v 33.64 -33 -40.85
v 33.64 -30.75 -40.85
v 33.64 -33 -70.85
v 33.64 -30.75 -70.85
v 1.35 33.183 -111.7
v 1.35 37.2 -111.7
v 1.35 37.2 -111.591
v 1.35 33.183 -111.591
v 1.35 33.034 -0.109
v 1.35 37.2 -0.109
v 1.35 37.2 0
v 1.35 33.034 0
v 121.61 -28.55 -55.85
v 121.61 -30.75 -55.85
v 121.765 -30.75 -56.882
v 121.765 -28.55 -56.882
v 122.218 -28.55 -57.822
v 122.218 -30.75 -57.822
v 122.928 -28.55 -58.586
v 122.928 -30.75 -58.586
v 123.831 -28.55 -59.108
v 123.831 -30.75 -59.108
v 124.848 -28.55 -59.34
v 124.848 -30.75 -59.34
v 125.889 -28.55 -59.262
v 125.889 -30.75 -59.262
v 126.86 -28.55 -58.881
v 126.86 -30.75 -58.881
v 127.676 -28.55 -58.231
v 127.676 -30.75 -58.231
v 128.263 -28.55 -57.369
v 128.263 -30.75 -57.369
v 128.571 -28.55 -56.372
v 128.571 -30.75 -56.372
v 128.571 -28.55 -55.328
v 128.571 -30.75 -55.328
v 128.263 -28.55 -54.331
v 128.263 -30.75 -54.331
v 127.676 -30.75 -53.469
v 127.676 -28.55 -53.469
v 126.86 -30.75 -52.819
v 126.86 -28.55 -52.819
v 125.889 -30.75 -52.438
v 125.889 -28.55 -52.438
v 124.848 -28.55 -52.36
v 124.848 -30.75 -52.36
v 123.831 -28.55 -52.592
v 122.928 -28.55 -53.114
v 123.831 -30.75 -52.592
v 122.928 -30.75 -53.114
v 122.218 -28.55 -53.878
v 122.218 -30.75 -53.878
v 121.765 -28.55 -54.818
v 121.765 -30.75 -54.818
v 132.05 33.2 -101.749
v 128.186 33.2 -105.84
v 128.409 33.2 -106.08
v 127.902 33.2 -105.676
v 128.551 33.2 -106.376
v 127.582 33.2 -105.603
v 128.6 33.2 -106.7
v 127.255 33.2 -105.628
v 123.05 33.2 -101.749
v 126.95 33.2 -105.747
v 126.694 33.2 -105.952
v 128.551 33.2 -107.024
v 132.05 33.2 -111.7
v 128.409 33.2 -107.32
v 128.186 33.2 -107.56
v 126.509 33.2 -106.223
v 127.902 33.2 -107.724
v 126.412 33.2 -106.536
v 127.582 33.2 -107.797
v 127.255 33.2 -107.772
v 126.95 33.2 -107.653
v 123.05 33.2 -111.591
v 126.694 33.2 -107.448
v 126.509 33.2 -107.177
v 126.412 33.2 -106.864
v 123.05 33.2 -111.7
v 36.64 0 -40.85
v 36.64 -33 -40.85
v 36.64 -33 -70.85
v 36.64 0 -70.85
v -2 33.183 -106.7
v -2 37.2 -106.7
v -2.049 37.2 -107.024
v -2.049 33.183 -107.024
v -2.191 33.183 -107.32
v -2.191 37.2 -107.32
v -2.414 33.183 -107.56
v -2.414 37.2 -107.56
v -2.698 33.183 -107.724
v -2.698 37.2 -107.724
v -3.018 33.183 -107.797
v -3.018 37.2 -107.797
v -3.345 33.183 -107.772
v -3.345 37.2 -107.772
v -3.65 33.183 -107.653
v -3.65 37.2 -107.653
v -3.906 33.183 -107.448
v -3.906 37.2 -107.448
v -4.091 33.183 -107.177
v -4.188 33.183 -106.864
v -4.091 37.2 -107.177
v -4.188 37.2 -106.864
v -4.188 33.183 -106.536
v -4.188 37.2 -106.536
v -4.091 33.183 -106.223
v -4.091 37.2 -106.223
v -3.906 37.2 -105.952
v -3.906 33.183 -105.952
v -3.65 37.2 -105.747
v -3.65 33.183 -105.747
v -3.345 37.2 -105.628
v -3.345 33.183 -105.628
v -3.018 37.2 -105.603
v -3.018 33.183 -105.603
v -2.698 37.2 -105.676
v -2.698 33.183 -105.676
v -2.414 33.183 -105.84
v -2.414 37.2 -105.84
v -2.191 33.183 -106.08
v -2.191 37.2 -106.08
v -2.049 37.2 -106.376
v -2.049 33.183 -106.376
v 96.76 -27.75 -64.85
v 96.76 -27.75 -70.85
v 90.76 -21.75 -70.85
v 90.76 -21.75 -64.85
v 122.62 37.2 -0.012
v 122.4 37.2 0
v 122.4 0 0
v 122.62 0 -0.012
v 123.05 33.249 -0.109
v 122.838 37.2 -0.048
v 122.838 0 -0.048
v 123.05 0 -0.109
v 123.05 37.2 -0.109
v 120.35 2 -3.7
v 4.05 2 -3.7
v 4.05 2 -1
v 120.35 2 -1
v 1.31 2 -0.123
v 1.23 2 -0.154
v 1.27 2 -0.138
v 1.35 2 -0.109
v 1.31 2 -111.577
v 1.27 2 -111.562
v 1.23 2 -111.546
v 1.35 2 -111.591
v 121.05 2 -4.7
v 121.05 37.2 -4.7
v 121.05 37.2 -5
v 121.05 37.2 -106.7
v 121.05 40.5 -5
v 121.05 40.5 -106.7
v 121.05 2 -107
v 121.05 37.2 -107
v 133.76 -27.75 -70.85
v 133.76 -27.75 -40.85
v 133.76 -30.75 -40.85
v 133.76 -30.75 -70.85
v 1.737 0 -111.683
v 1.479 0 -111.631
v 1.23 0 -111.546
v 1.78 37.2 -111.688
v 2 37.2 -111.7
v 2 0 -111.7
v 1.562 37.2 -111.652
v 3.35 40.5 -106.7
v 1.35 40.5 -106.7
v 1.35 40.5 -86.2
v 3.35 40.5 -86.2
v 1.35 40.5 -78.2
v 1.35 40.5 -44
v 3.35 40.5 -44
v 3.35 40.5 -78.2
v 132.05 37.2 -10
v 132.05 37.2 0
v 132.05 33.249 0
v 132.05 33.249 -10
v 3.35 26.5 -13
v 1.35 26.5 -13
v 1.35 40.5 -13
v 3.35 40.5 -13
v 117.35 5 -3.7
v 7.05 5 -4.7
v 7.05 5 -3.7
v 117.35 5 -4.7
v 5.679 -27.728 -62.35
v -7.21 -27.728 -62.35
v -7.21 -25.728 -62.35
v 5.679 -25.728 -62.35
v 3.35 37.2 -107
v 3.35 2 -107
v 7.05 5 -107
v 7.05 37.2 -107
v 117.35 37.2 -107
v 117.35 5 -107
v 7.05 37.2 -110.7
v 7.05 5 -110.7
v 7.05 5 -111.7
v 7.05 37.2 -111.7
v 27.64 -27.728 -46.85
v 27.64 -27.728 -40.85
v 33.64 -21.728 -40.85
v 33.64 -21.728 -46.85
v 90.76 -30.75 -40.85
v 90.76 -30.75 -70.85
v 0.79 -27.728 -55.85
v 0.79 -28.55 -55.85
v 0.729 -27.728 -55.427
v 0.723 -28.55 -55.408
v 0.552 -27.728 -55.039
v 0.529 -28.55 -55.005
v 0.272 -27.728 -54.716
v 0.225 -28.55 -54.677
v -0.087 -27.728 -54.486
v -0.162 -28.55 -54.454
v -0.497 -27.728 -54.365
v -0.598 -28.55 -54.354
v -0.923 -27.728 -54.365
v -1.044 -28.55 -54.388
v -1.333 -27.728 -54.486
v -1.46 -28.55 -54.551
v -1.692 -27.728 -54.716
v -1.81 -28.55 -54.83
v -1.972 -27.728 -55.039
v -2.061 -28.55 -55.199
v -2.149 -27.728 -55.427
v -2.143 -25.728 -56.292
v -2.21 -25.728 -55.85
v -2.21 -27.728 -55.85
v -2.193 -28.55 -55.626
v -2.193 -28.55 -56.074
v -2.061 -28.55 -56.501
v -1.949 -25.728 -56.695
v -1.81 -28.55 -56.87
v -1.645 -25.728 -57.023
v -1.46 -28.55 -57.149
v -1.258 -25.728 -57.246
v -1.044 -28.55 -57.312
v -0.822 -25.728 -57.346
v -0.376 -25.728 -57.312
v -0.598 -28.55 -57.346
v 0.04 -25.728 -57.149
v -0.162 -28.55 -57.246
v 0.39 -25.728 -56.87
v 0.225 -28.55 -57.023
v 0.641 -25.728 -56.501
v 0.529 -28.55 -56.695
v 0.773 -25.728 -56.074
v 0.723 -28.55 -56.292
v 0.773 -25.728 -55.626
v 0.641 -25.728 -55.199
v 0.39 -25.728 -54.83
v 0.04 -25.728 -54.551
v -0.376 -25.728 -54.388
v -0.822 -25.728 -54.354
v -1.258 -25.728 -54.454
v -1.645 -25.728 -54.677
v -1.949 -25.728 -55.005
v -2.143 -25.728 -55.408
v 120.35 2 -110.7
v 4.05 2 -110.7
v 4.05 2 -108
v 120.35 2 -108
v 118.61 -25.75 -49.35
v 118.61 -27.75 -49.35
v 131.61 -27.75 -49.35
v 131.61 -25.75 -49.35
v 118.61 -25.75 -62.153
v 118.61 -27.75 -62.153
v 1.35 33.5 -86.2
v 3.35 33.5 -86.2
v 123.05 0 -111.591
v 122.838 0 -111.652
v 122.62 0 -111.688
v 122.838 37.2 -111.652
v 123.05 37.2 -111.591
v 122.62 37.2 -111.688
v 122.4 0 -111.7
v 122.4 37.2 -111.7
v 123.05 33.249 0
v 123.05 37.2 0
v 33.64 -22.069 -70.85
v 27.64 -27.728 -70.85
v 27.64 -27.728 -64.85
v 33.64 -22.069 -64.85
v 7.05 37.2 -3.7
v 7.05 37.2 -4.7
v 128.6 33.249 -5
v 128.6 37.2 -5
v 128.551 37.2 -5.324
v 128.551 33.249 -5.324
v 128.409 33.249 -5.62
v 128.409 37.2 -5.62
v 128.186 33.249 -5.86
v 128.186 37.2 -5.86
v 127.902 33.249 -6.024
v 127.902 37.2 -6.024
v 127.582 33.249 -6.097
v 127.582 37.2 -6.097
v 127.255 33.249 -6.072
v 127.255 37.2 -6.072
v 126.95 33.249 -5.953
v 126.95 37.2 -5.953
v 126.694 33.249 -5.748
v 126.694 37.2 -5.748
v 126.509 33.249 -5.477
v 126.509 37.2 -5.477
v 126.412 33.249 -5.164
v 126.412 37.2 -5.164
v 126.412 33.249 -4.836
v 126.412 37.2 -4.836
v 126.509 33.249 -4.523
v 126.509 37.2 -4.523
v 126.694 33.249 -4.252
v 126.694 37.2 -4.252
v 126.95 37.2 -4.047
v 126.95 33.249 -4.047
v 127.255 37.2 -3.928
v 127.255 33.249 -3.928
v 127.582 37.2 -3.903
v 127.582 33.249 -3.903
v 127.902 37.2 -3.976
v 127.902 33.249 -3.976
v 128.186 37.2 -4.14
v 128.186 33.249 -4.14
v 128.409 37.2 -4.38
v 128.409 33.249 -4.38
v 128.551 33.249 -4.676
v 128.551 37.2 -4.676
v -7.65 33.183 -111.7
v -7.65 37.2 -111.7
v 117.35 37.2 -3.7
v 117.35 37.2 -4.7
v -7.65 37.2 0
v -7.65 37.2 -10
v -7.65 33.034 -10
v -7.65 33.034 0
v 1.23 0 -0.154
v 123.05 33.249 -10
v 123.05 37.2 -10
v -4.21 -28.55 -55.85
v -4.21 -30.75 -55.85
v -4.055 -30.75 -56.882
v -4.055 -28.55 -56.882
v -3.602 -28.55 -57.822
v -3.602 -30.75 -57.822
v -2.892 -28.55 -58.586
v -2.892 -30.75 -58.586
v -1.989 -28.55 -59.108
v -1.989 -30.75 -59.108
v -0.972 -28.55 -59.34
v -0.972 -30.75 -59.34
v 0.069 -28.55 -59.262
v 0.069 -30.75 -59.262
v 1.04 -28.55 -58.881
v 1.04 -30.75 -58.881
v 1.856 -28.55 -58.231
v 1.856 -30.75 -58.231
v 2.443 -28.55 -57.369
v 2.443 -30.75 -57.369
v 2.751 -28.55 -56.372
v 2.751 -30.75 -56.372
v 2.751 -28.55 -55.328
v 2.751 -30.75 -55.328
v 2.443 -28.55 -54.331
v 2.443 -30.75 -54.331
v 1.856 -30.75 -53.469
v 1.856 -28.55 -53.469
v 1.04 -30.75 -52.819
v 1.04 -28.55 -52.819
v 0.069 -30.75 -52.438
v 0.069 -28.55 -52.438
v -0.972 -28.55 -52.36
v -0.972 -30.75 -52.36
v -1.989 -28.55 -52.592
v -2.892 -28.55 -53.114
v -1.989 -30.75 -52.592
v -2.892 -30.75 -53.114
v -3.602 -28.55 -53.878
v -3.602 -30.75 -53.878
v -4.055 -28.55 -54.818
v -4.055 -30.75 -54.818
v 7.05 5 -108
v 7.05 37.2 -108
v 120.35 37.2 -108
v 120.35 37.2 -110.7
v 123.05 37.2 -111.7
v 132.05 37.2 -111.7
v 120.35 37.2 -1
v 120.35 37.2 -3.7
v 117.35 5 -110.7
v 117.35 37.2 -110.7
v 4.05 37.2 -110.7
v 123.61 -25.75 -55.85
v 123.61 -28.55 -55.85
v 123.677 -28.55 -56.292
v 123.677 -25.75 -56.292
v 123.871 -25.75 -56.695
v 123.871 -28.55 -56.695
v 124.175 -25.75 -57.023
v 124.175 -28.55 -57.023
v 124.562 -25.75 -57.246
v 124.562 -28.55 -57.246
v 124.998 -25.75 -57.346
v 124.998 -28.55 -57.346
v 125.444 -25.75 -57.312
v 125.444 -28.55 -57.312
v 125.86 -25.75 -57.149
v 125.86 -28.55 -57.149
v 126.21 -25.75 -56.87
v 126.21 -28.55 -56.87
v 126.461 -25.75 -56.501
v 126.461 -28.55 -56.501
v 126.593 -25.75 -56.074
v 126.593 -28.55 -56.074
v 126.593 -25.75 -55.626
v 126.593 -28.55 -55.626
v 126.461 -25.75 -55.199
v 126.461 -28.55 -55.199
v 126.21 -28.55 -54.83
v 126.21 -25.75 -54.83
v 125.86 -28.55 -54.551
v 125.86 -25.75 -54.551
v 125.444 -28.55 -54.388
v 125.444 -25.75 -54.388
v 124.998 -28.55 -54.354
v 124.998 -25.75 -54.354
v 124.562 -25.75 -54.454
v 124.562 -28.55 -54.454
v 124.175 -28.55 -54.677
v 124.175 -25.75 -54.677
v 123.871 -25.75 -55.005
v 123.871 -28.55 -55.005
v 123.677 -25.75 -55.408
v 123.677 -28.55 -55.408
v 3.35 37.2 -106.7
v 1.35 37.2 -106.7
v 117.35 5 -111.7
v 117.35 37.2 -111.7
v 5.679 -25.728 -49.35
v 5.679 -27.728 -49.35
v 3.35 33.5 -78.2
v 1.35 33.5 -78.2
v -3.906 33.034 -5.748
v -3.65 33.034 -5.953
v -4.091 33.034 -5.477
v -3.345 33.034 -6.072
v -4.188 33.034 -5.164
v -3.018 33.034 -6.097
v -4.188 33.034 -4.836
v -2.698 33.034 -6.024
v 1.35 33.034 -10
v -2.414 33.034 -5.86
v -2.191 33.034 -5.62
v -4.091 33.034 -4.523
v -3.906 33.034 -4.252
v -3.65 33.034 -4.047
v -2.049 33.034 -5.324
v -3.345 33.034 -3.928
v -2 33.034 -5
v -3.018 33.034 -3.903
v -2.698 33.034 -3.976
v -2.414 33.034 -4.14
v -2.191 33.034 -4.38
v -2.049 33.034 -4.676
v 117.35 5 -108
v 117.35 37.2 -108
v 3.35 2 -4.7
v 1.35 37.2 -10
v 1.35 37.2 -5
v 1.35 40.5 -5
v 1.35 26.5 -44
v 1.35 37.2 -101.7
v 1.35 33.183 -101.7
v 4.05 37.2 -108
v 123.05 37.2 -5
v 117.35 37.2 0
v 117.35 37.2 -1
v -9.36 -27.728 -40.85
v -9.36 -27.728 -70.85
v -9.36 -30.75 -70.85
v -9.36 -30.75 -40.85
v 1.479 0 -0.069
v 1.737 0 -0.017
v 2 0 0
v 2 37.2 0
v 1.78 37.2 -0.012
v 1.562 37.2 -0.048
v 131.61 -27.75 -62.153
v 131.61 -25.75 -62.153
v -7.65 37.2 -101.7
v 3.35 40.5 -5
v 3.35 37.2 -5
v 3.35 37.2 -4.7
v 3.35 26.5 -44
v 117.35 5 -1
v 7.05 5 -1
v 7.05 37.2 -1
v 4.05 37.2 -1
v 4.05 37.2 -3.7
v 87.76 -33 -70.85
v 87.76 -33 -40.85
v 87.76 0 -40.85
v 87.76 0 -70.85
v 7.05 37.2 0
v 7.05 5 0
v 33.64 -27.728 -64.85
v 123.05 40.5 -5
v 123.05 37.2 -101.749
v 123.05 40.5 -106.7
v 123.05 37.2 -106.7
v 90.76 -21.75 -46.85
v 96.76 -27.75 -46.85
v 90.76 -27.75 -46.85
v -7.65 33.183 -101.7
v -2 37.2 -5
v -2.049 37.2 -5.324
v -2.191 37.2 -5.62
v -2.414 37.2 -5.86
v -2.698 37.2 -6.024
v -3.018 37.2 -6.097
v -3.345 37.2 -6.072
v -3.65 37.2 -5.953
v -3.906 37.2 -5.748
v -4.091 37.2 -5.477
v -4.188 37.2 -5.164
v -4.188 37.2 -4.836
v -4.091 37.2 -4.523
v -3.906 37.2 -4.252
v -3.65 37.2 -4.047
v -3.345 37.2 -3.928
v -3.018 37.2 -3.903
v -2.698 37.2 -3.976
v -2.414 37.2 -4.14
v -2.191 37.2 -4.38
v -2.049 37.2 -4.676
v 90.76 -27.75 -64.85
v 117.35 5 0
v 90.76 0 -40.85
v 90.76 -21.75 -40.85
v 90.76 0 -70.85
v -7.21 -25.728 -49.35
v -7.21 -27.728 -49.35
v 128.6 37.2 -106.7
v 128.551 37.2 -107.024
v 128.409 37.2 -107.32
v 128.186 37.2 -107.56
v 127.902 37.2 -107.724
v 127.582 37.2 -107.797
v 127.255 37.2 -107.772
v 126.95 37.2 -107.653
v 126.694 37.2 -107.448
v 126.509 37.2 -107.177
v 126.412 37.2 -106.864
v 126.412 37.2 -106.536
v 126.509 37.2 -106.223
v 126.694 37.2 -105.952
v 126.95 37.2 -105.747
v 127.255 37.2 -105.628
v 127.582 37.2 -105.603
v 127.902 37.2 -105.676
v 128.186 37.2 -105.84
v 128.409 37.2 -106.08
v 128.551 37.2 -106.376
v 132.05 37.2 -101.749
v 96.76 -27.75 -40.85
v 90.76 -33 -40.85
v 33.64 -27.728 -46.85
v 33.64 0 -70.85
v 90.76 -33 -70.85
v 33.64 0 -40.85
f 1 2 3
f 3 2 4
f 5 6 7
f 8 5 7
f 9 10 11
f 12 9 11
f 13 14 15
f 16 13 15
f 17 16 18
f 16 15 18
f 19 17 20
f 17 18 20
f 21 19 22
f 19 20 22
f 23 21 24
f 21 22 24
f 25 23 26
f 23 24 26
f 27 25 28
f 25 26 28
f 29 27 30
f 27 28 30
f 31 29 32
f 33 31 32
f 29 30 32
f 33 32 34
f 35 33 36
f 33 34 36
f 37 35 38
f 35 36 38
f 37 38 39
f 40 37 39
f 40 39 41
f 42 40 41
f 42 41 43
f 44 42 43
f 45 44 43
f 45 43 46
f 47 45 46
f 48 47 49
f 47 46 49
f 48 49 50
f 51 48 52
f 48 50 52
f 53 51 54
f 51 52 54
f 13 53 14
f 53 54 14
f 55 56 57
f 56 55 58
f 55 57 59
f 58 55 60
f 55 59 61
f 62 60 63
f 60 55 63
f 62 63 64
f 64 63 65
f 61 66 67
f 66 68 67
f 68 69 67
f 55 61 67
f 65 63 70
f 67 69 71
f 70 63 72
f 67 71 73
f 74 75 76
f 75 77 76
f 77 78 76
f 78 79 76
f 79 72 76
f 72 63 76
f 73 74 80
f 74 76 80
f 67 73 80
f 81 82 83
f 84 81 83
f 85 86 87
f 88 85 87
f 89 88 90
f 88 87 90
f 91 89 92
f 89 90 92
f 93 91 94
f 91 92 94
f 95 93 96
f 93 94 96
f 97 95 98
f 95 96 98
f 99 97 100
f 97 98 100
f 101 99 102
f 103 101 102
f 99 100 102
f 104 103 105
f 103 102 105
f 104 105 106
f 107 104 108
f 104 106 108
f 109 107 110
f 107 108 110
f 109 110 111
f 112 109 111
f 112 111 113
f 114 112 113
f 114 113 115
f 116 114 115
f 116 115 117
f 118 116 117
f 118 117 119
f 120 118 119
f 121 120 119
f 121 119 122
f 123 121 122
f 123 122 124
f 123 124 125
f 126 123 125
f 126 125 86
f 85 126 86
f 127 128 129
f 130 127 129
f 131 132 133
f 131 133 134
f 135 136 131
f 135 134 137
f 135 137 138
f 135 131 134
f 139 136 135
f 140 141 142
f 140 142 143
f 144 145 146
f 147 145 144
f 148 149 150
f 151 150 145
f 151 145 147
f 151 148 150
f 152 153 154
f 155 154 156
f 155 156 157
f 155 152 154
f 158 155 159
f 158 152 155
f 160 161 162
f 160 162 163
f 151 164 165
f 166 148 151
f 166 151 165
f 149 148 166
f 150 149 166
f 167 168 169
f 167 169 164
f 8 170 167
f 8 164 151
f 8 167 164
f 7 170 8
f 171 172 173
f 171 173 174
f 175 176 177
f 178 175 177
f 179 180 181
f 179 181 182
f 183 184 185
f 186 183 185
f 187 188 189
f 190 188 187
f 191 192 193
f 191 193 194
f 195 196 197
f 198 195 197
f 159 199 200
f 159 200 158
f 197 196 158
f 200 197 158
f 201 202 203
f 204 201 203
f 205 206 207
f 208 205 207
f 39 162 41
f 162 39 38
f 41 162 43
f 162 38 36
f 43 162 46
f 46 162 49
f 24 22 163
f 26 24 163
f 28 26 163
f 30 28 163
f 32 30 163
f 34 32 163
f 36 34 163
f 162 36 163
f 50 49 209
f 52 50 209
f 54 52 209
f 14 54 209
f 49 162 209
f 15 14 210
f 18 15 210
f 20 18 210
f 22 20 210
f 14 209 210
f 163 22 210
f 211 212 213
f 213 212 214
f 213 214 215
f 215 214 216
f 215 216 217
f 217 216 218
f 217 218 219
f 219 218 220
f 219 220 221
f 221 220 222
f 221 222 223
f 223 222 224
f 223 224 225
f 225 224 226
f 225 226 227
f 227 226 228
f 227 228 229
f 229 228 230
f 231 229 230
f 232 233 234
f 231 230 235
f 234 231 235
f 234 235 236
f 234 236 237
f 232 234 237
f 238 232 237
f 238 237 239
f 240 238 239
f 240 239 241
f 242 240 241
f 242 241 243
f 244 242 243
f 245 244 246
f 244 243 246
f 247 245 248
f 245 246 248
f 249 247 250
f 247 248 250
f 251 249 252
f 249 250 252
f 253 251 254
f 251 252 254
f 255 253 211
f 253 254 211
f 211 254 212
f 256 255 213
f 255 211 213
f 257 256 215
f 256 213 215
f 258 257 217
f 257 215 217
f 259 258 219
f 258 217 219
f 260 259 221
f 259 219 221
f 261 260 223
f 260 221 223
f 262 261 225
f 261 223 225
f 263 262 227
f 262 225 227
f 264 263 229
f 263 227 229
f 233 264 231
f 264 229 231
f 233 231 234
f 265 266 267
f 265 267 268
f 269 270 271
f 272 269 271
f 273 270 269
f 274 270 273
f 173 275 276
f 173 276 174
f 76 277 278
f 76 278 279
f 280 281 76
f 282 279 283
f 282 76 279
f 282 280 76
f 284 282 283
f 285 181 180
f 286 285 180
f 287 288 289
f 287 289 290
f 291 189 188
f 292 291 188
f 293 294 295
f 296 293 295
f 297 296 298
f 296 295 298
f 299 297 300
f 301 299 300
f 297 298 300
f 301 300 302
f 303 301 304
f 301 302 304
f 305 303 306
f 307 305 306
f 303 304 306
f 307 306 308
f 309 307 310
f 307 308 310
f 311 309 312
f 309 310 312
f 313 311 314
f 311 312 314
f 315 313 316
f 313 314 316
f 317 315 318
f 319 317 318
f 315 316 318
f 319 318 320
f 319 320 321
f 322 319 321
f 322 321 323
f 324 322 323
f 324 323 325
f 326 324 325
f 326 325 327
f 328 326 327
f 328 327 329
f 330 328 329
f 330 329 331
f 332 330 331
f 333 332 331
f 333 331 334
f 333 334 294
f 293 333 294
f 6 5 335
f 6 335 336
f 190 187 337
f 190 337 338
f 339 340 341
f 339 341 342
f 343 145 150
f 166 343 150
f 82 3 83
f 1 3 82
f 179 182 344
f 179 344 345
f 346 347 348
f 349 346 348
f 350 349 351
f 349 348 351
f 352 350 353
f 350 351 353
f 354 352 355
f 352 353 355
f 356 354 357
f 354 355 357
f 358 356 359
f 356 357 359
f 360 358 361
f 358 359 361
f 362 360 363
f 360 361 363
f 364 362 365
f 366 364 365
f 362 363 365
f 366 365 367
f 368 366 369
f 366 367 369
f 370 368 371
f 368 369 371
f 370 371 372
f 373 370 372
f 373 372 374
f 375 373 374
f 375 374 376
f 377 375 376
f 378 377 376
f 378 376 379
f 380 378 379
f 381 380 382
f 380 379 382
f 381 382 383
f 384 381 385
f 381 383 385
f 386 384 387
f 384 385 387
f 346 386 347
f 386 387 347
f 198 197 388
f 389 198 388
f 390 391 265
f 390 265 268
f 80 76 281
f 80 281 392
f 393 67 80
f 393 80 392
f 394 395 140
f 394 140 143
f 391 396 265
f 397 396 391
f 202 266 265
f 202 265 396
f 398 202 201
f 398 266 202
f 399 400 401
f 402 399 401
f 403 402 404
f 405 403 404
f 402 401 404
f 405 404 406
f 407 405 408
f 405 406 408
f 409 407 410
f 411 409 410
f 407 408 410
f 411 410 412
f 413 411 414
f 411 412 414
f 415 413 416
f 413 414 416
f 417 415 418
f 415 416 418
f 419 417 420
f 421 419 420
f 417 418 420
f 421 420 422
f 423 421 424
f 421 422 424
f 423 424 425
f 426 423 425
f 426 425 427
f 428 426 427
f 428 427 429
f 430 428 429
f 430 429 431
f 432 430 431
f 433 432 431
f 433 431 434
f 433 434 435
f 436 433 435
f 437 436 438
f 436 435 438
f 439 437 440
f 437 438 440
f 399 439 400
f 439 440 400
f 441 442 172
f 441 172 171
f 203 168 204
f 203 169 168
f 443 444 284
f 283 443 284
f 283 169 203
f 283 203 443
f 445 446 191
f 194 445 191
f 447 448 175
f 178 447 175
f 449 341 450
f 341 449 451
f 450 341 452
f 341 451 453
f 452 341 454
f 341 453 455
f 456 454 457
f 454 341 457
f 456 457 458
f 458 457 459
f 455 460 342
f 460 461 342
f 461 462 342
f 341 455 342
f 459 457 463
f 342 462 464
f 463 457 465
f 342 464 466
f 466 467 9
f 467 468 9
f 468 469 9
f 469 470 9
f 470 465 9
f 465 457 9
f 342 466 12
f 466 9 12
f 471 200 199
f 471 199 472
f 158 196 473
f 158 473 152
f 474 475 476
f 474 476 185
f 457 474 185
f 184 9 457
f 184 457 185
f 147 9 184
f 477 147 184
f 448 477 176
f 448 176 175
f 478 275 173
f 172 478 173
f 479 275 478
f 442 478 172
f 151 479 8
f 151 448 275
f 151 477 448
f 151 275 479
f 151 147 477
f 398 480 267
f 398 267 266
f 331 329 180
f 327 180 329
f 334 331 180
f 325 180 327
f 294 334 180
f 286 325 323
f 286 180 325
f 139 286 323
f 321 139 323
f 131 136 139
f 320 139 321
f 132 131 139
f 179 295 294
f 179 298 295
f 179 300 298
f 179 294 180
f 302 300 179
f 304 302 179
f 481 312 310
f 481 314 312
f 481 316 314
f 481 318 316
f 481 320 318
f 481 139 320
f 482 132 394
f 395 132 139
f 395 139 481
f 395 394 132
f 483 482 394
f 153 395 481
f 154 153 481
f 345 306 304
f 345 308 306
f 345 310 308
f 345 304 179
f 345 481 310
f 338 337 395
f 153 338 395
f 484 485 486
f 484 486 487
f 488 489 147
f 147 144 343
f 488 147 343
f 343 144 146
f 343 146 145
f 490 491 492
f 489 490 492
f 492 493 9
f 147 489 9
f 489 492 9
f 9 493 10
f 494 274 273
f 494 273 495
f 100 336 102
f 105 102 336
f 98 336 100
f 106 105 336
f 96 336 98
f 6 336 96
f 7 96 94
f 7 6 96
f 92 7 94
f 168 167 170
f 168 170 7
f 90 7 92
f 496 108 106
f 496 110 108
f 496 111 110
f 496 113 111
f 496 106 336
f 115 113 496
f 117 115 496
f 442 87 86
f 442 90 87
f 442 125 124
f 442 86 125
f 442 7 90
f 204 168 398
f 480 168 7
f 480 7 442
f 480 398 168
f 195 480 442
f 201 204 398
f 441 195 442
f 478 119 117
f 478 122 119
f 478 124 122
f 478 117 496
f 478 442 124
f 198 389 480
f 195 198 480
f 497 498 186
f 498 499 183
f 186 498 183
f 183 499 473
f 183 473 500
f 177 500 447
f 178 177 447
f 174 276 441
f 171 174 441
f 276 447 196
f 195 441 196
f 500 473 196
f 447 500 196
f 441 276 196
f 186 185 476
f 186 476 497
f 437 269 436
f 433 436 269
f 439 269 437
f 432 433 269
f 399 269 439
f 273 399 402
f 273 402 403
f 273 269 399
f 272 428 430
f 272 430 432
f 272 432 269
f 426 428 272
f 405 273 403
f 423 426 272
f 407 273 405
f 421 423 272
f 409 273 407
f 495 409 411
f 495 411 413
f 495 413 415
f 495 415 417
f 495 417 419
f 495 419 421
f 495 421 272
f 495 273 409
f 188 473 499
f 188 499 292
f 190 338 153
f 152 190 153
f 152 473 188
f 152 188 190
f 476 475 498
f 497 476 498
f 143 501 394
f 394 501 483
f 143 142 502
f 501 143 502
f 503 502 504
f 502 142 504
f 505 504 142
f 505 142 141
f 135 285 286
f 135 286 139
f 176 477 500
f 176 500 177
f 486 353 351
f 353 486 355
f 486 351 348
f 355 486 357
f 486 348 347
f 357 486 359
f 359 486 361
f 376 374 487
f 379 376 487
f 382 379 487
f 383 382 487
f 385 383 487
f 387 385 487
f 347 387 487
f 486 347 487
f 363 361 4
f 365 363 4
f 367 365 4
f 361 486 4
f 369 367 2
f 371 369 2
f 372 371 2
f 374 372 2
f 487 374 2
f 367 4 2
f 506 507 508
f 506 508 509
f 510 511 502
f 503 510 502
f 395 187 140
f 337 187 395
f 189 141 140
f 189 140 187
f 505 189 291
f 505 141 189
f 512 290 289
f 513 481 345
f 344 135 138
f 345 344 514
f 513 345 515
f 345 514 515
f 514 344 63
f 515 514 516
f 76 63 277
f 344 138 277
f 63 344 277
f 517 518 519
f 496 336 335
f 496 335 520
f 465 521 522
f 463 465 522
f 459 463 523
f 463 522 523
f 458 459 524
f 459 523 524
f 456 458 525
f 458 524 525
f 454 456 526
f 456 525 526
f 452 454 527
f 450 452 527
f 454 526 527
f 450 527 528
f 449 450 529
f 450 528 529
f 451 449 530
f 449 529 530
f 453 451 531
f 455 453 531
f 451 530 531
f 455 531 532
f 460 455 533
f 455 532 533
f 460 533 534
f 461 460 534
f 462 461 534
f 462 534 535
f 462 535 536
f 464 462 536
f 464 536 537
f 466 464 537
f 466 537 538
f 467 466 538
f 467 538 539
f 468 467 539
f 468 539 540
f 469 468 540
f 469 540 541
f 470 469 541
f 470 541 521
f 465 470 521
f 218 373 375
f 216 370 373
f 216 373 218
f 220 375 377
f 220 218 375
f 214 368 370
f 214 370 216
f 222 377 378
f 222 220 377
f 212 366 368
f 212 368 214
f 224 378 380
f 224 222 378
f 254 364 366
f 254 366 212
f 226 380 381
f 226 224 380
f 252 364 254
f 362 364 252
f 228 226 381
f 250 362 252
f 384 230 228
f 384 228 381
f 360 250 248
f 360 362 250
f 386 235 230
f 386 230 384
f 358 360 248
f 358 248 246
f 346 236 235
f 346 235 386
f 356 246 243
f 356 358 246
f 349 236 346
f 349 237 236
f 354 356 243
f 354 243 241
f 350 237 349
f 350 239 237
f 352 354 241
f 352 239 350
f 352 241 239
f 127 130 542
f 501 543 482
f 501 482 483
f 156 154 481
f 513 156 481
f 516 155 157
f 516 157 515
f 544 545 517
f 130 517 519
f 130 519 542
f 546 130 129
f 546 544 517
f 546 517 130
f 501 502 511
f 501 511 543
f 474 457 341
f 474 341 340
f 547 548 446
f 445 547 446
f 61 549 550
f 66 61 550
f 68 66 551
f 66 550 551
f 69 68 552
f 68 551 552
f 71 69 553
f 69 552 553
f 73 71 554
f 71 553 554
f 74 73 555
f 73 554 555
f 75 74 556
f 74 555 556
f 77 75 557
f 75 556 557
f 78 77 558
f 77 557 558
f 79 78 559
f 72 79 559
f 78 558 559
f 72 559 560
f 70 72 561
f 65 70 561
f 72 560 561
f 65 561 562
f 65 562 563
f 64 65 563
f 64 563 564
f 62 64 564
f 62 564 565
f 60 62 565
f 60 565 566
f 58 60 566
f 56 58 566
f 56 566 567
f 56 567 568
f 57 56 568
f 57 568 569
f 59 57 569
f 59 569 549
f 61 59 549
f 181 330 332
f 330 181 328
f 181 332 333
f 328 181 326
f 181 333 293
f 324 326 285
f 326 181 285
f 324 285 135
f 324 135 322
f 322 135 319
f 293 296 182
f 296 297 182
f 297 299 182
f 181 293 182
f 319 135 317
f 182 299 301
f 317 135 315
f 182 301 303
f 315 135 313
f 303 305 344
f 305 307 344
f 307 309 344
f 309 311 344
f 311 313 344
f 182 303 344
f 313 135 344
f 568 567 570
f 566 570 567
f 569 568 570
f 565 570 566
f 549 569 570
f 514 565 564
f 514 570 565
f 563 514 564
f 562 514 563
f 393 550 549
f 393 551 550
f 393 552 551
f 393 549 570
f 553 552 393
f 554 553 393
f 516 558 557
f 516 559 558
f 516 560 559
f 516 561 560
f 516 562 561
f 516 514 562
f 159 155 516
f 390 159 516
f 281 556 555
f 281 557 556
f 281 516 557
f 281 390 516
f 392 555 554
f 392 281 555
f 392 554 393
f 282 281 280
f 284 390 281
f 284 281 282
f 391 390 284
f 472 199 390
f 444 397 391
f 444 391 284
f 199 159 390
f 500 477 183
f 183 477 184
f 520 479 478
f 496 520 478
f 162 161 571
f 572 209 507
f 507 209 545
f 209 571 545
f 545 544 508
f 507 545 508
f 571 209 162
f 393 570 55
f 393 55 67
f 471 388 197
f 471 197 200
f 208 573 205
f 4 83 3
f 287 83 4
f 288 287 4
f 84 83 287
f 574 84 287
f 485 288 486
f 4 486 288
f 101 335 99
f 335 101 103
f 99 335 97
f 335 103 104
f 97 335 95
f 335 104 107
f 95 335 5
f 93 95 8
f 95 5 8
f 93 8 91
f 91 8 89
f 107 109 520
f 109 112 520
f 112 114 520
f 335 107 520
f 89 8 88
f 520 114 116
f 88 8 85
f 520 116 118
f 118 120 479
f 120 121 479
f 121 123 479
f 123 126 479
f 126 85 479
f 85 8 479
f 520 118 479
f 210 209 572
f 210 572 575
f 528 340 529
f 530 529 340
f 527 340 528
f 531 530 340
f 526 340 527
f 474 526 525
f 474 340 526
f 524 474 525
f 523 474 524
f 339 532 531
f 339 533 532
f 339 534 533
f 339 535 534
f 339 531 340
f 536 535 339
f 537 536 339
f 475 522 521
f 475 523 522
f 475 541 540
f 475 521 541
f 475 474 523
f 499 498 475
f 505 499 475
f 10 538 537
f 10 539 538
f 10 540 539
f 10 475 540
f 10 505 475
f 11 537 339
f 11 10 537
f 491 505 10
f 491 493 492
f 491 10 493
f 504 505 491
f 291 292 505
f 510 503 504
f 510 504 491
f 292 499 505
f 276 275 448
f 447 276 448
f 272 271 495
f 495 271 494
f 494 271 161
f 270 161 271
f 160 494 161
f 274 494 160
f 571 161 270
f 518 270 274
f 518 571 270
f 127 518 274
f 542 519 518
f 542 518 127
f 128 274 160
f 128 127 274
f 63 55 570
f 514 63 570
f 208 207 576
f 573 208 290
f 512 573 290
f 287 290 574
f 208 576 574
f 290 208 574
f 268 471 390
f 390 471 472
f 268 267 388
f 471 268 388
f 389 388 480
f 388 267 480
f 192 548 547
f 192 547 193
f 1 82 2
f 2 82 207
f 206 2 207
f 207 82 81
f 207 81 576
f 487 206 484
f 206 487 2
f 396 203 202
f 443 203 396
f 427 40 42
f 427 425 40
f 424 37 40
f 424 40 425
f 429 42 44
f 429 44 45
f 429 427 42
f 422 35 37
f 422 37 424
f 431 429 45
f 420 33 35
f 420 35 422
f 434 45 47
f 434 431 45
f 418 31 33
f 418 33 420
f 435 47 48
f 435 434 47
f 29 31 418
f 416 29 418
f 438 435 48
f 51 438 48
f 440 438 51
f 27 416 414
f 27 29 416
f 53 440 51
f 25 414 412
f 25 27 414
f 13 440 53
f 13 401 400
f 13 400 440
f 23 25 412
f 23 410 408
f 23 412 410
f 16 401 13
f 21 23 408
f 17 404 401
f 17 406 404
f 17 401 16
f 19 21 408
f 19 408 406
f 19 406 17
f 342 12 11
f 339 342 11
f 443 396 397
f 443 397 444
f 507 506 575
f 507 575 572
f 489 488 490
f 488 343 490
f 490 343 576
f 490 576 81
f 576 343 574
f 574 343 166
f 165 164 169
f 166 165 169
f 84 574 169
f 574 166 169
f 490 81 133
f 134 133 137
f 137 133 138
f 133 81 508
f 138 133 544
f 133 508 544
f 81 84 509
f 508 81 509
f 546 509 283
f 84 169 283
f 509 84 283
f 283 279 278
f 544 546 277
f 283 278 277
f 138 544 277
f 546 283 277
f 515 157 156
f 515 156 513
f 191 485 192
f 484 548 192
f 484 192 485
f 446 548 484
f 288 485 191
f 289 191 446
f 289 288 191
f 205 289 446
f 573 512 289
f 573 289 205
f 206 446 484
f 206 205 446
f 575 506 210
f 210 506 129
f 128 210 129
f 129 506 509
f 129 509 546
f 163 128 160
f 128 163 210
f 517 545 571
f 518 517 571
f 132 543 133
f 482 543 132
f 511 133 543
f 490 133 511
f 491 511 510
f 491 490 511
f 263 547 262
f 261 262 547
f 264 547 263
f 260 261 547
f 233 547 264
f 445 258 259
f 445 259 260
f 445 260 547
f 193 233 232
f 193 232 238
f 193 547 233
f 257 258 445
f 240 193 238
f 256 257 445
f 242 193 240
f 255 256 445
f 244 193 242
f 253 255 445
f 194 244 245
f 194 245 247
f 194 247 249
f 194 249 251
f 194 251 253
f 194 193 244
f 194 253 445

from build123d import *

# Parameters (mm, degrees)
SKETCH1_W            = 124.4
SKETCH1_H            = 111.7
BOSS_EXTRUDE1_DEPTH  = 2
SKETCH2_W            = 2
SKETCH2_H            = 101.7
BOSS_EXTRUDE2_DEPTH  = 38.5
SKETCH3_W            = 121.7
SKETCH3_H            = 4.7
BOSS_EXTRUDE3_DEPTH  = 3
SKETCH5_W            = 116.3
SKETCH5_H            = 2.7
CUT_EXTRUDE8_DEPTH   = 3
SKETCH14_W           = 121.7
SKETCH14_H           = 4.7
BOSS_EXTRUDE6_DEPTH  = 3
SKETCH15_W           = 116.3
SKETCH15_H           = 2.7
CUT_EXTRUDE14_DEPTH  = 3
SKETCH18_W           = 2
SKETCH18_H           = 0.3
BOSS_EXTRUDE7_DEPTH  = 35.2
SKETCH19_W           = 5.7
SKETCH19_H           = 4.7
BOSS_EXTRUDE8_DEPTH  = 32.2
SKETCH20_W           = 2.7
SKETCH20_H           = 32.2
CUT_EXTRUDE15_DEPTH  = 3
SKETCH21_W           = 2.7
SKETCH21_H           = 32.2
CUT_EXTRUDE16_DEPTH  = 3
SKETCH24_W           = 2.7
SKETCH24_H           = 32.2
CUT_EXTRUDE18_DEPTH  = 3
SKETCH25_W           = 2.7
SKETCH25_H           = 32.2
CUT_EXTRUDE19_DEPTH  = 3
SKETCH30_W           = 31
SKETCH30_H           = 14
SKETCH30_W_2         = 8
SKETCH30_H_2         = 7
CUT_EXTRUDE23_DEPTH  = 2
SKETCH31_W           = 6
SKETCH31_H           = 36.2
BOSS_EXTRUDE9_DEPTH  = 1.35
FILLET1_R            = 2
SKETCH33_W           = 99.7
SKETCH33_H           = 3
BOSS_EXTRUDE11_DEPTH = 1.35
SKETCH43_W           = 1.229805297
SKETCH43_H           = 112.077966817
CUT_EXTRUDE25_DEPTH  = 38.2
SKETCH47_W           = 57.12
SKETCH47_H           = 30
BOSS_EXTRUDE22_DEPTH = 38
SKETCH49_W           = 51.12
SKETCH49_H           = 30
CUT_EXTRUDE30_DEPTH  = 38
SKETCH51_W           = 2.352063359
SKETCH51_H           = 112.382279656
CUT_EXTRUDE33_DEPTH  = 77.2
SKETCH54_W           = 10
SKETCH54_H           = 4.16571725
SKETCH54_H_2         = 4.016594053
BOSS_EXTRUDE23_DEPTH = 9
SKETCH55_W           = 10
SKETCH55_H           = 3.950767522
SKETCH55_W_2         = 9.95127899
SKETCH55_H_2         = 4
BOSS_EXTRUDE24_DEPTH = 9
SKETCH56_R           = 1.1
CUT_EXTRUDE34_DEPTH  = 10
SKETCH57_R           = 1
CUT_EXTRUDE35_DEPTH  = 99.41
SKETCH58_W           = 30
SKETCH58_H           = 3
BOSS_EXTRUDE25_DEPTH = 43
SKETCH59_W           = 30
SKETCH59_H           = 3.021561104
BOSS_EXTRUDE26_DEPTH = 43
BOSS_EXTRUDE28_DEPTH = 6
BOSS_EXTRUDE29_DEPTH = 6
BOSS_EXTRUDE30_DEPTH = 6
BOSS_EXTRUDE31_DEPTH = 6
SKETCH64_W           = 30
SKETCH64_H           = 6.546083461
CUT_EXTRUDE36_DEPTH  = 101.12
SKETCH65_R           = 1.5
CUT_EXTRUDE37_DEPTH  = 6
SKETCH67_R           = 1.5
CUT_EXTRUDE39_DEPTH  = 6
SKETCH68_W           = 12.888719924
SKETCH68_H           = 13
BOSS_EXTRUDE32_DEPTH = 2
SKETCH69_W           = 13
SKETCH69_H           = 12.803280229
BOSS_EXTRUDE33_DEPTH = 2
SKETCH70_R           = 1.5
CUT_EXTRUDE40_DEPTH  = 10
SKETCH71_R           = 1.5
CUT_EXTRUDE41_DEPTH  = 10
SKETCH72_R           = 3.5
CUT_EXTRUDE42_DEPTH  = 2.2
SKETCH73_R           = 3.5
CUT_EXTRUDE43_DEPTH  = 2.2


with BuildPart() as part:
    # Sketch1 → Boss-Extrude1 (new body)
    with BuildSketch(Plane(origin=(0, 0, 0), x_dir=(1, 0, 0), z_dir=(0, 1, 0))):
        with Locations((62.2, 55.85)):
            Rectangle(SKETCH1_W, SKETCH1_H)
    extrude(amount=BOSS_EXTRUDE1_DEPTH)

    # Sketch2 → Boss-Extrude2 (add)
    with BuildSketch(Plane(origin=(0, 2, 0), x_dir=(1, 0, 0), z_dir=(0, 1, 0))):
        with Locations((122.05, 55.85)):
            Rectangle(SKETCH2_W, SKETCH2_H)
        with Locations((2.35, 55.85)):
            Rectangle(SKETCH2_W, SKETCH2_H)
    extrude(amount=BOSS_EXTRUDE2_DEPTH)

    # Sketch3 → Boss-Extrude3 (add)
    with BuildSketch(Plane(origin=(0, 2, 0), x_dir=(1, 0, 0), z_dir=(0, 1, 0))):
        with Locations((62.2, 2.35)):
            Rectangle(SKETCH3_W, SKETCH3_H)
    extrude(amount=BOSS_EXTRUDE3_DEPTH)

    # Sketch5 → Cut-Extrude8 (cut)
    with BuildSketch(Plane(origin=(0, 5, 0), x_dir=(1, 0, 0), z_dir=(0, 1, 0))):
        with Locations((62.2, 2.35)):
            Rectangle(SKETCH5_W, SKETCH5_H)
    extrude(amount=-CUT_EXTRUDE8_DEPTH, mode=Mode.SUBTRACT)

    # Sketch14 → Boss-Extrude6 (add)
    with BuildSketch(Plane(origin=(0, 2, 0), x_dir=(1, 0, 0), z_dir=(0, 1, 0))):
        with Locations((62.2, 109.35)):
            Rectangle(SKETCH14_W, SKETCH14_H)
    extrude(amount=BOSS_EXTRUDE6_DEPTH)

    # Sketch15 → Cut-Extrude14 (cut)
    with BuildSketch(Plane(origin=(0, 5, 0), x_dir=(1, 0, 0), z_dir=(0, 1, 0))):
        with Locations((62.2, 109.35)):
            Rectangle(SKETCH15_W, SKETCH15_H)
    extrude(amount=-CUT_EXTRUDE14_DEPTH, mode=Mode.SUBTRACT)

    # Sketch18 → Boss-Extrude7 (add)
    with BuildSketch(Plane(origin=(0, 2, 0), x_dir=(1, 0, 0), z_dir=(0, 1, 0))):
        with Locations((2.35, 106.85)):
            Rectangle(SKETCH18_W, SKETCH18_H)
        with Locations((122.05, 106.85)):
            Rectangle(SKETCH18_W, SKETCH18_H)
        with Locations((122.05, 4.85)):
            Rectangle(SKETCH18_W, SKETCH18_H)
        with Locations((2.35, 4.85)):
            Rectangle(SKETCH18_W, SKETCH18_H)
    extrude(amount=BOSS_EXTRUDE7_DEPTH)

    # Sketch19 → Boss-Extrude8 (add)
    with BuildSketch(Plane(origin=(0, 5, 0), x_dir=(1, 0, 0), z_dir=(0, 1, 0))):
        with Locations((120.2, 2.35)):
            Rectangle(SKETCH19_W, SKETCH19_H)
        with Locations((4.2, 2.35)):
            Rectangle(SKETCH19_W, SKETCH19_H)
        with Locations((120.2, 109.35)):
            Rectangle(SKETCH19_W, SKETCH19_H)
        with Locations((4.2, 109.35)):
            Rectangle(SKETCH19_W, SKETCH19_H)
    extrude(amount=BOSS_EXTRUDE8_DEPTH)

    # Sketch20 → Cut-Extrude15 (cut)
    with BuildSketch(Plane.ZY.offset(-117.35)):
        with Locations((-109.35, 21.1)):
            Rectangle(SKETCH20_W, SKETCH20_H)
    extrude(amount=-CUT_EXTRUDE15_DEPTH, mode=Mode.SUBTRACT)

    # Sketch21 → Cut-Extrude16 (cut)
    with BuildSketch(Plane(origin=(7.05, 0, 0), x_dir=(0, 0, -1), z_dir=(1, 0, 0))):
        with Locations((109.35, 21.1)):
            Rectangle(SKETCH21_W, SKETCH21_H)
    extrude(amount=-CUT_EXTRUDE16_DEPTH, mode=Mode.SUBTRACT)

    # Sketch24 → Cut-Extrude18 (cut)
    with BuildSketch(Plane(origin=(7.05, 0, 0), x_dir=(0, 0, -1), z_dir=(1, 0, 0))):
        with Locations((2.35, 21.1)):
            Rectangle(SKETCH24_W, SKETCH24_H)
    extrude(amount=-CUT_EXTRUDE18_DEPTH, mode=Mode.SUBTRACT)

    # Sketch25 → Cut-Extrude19 (cut)
    with BuildSketch(Plane.ZY.offset(-117.35)):
        with Locations((-2.35, 21.1)):
            Rectangle(SKETCH25_W, SKETCH25_H)
    extrude(amount=-CUT_EXTRUDE19_DEPTH, mode=Mode.SUBTRACT)

    # Sketch30 → Cut-Extrude23 (cut)
    with BuildSketch(Plane.ZY.offset(-1.35)):
        with Locations((-28.5, 33.5)):
            Rectangle(SKETCH30_W, SKETCH30_H)
        with Locations((-82.2, 37)):
            Rectangle(SKETCH30_W_2, SKETCH30_H_2)
    extrude(amount=-CUT_EXTRUDE23_DEPTH, mode=Mode.SUBTRACT)

    # Sketch31 → Boss-Extrude9 (add)
    with BuildSketch(Plane(origin=(123.05, 0, 0), x_dir=(0, 0, -1), z_dir=(1, 0, 0))):
        with Locations((3, 20.1)):
            Rectangle(SKETCH31_W, SKETCH31_H)
        with Locations((108.7, 20.1)):
            Rectangle(SKETCH31_W, SKETCH31_H)
    extrude(amount=BOSS_EXTRUDE9_DEPTH)

    # Fillet1
    fillet1_edges = [part.edges().sort_by_distance(p)[0] for p in [
        (0, 1, 0),
        (124.4, 19.1, 0),
        (124.4, 19.1, -111.7),
        (0, 1, -111.7),
    ]]
    fillet(fillet1_edges, radius=FILLET1_R)

    # Sketch33 → Boss-Extrude11 (add)
    with BuildSketch(Plane(origin=(123.05, 0, 0), x_dir=(0, 0, -1), z_dir=(1, 0, 0))):
        with Locations((55.85, 3.5)):
            Rectangle(SKETCH33_W, SKETCH33_H)
    extrude(amount=BOSS_EXTRUDE11_DEPTH)

    # Sketch43 → Cut-Extrude25 (cut, through all)
    with BuildSketch(Plane(origin=(0, 37.2, 0), x_dir=(1, 0, 0), z_dir=(0, 1, 0))):
        with Locations((0.614902649, 56.193231497)):
            Rectangle(SKETCH43_W, SKETCH43_H)
    extrude(amount=-CUT_EXTRUDE25_DEPTH, mode=Mode.SUBTRACT)

    # Sketch47 → Boss-Extrude22 (add)
    with BuildSketch(Plane(origin=(0, 0, 0), x_dir=(-1, 0, 0), z_dir=(0, -1, 0))):
        with Locations((-62.2, 55.85)):
            Rectangle(SKETCH47_W, SKETCH47_H)
    extrude(amount=BOSS_EXTRUDE22_DEPTH)

    # Sketch49 → Cut-Extrude30 (cut)
    with BuildSketch(Plane(origin=(0, -38, 0), x_dir=(-1, 0, 0), z_dir=(0, -1, 0))):
        with Locations((-62.2, 55.85)):
            Rectangle(SKETCH49_W, SKETCH49_H)
    extrude(amount=-CUT_EXTRUDE30_DEPTH, mode=Mode.SUBTRACT)

    # Sketch51 → Cut-Extrude33 (cut, through all)
    with BuildSketch(Plane(origin=(0, 38.2, 0), x_dir=(1, 0, 0), z_dir=(0, 1, 0))):
        with Locations((124.22603168, 56.299711796)):
            Rectangle(SKETCH51_W, SKETCH51_H)
    extrude(amount=-CUT_EXTRUDE33_DEPTH, mode=Mode.SUBTRACT)

    # Sketch54 → Boss-Extrude23 (add)
    with BuildSketch(Plane.ZY.offset(-1.35)):
        with Locations((-5, 35.117141375)):
            Rectangle(SKETCH54_W, SKETCH54_H)
        with Locations((-106.7, 35.191702973)):
            Rectangle(SKETCH54_W, SKETCH54_H_2)
    extrude(amount=BOSS_EXTRUDE23_DEPTH)

    # Sketch55 → Boss-Extrude24 (add)
    with BuildSketch(Plane(origin=(123.05, 0, 0), x_dir=(0, 0, -1), z_dir=(1, 0, 0))):
        with Locations((5, 35.224616239)):
            Rectangle(SKETCH55_W, SKETCH55_H)
        with Locations((106.724360505, 35.2)):
            Rectangle(SKETCH55_W_2, SKETCH55_H_2)
    extrude(amount=BOSS_EXTRUDE24_DEPTH)

    # Sketch56 → Cut-Extrude34 (cut)
    with BuildSketch(Plane(origin=(0, 37.2, 0), x_dir=(1, 0, 0), z_dir=(0, 1, 0))):
        with Locations((-3.1, 106.7)):
            Circle(SKETCH56_R)
        with Locations((127.5, 106.7)):
            Circle(SKETCH56_R)
        with Locations((127.5, 5)):
            Circle(SKETCH56_R)
        with Locations((-3.1, 5)):
            Circle(SKETCH56_R)
    extrude(amount=-CUT_EXTRUDE34_DEPTH, mode=Mode.SUBTRACT)

    # Sketch57 → Cut-Extrude35 (cut, through all)
    with BuildSketch(Plane(origin=(90.76, 0, 0), x_dir=(0, 0, -1), z_dir=(1, 0, 0))):
        with Locations((45.85, -34)):
            Circle(SKETCH57_R)
        with Locations((65.85, -34)):
            Circle(SKETCH57_R)
    extrude(amount=-CUT_EXTRUDE35_DEPTH, mode=Mode.SUBTRACT)

    # Sketch58 → Boss-Extrude25 (add)
    with BuildSketch(Plane(origin=(90.76, 0, 0), x_dir=(0, 0, -1), z_dir=(1, 0, 0))):
        with Locations((55.85, -29.25)):
            Rectangle(SKETCH58_W, SKETCH58_H)
    extrude(amount=BOSS_EXTRUDE25_DEPTH)

    # Sketch59 → Boss-Extrude26 (add)
    with BuildSketch(Plane.ZY.offset(-33.64)):
        with Locations((-55.85, -29.239219448)):
            Rectangle(SKETCH59_W, SKETCH59_H)
    extrude(amount=BOSS_EXTRUDE26_DEPTH)

    # Sketch61 → Boss-Extrude28 (add)
    with BuildSketch(Plane.XY.offset(-40.85)):
        Polygon((90.76, -21.75), (96.76, -27.75), (90.76, -27.75), align=None)
    extrude(amount=-BOSS_EXTRUDE28_DEPTH)

    # Sketch62 → Boss-Extrude29 (add)
    with BuildSketch(Plane(origin=(0, 0, -70.85), x_dir=(-1, 0, 0), z_dir=(0, 0, -1))):
        Polygon((-90.76, -21.75), (-90.76, -27.75), (-96.76, -27.75), align=None)
    extrude(amount=-BOSS_EXTRUDE29_DEPTH)

    # Sketch60 → Boss-Extrude30 (add)
    with BuildSketch(Plane.XY.offset(-40.85)):
        Polygon((27.64, -27.728438896), (33.64, -21.728438896), (33.64, -27.728438896), align=None)
    extrude(amount=-BOSS_EXTRUDE30_DEPTH)

    # Sketch63 → Boss-Extrude31 (add)
    with BuildSketch(Plane(origin=(0, 0, -70.85), x_dir=(-1, 0, 0), z_dir=(0, 0, -1))):
        Polygon((-33.64, -22.069435851), (-33.64, -27.728438896), (-27.64, -27.728438896), align=None)
    extrude(amount=-BOSS_EXTRUDE31_DEPTH)

    # Sketch64 → Cut-Extrude36 (cut, through all)
    with BuildSketch(Plane.ZY.offset(-33.64)):
        with Locations((-55.85, -36.27304173)):
            Rectangle(SKETCH64_W, SKETCH64_H)
    extrude(amount=-CUT_EXTRUDE36_DEPTH, mode=Mode.SUBTRACT)

    # Sketch65 → Cut-Extrude37 (cut)
    with BuildSketch(Plane(origin=(0, -30.75, 0), x_dir=(-1, 0, 0), z_dir=(0, -1, 0))):
        with Locations((-125.11, 55.85)):
            Circle(SKETCH65_R)
    extrude(amount=-CUT_EXTRUDE37_DEPTH, mode=Mode.SUBTRACT)

    # Sketch67 → Cut-Extrude39 (cut)
    with BuildSketch(Plane.XZ.offset(30.75)):
        with Locations((-0.71, -55.85)):
            Circle(SKETCH67_R)
    extrude(amount=-CUT_EXTRUDE39_DEPTH, mode=Mode.SUBTRACT)

    # Sketch68 → Boss-Extrude32 (add)
    with BuildSketch(Plane(origin=(0, -27.728438896, 0), x_dir=(1, 0, 0), z_dir=(0, 1, 0))):
        with Locations((-0.765640038, 55.85)):
            Rectangle(SKETCH68_W, SKETCH68_H)
    extrude(amount=BOSS_EXTRUDE32_DEPTH)

    # Sketch69 → Boss-Extrude33 (add)
    with BuildSketch(Plane(origin=(0, -27.75, 0), x_dir=(1, 0, 0), z_dir=(0, 1, 0))):
        with Locations((125.11, 55.751640115)):
            Rectangle(SKETCH69_W, SKETCH69_H)
    extrude(amount=BOSS_EXTRUDE33_DEPTH)

    # Sketch70 → Cut-Extrude40 (cut)
    with BuildSketch(Plane(origin=(0, -30.75, 0), x_dir=(-1, 0, 0), z_dir=(0, -1, 0))):
        with Locations((-125.11, 55.85)):
            Circle(SKETCH70_R)
    extrude(amount=-CUT_EXTRUDE40_DEPTH, mode=Mode.SUBTRACT)

    # Sketch71 → Cut-Extrude41 (cut)
    with BuildSketch(Plane(origin=(0, -30.75, 0), x_dir=(-1, 0, 0), z_dir=(0, -1, 0))):
        with Locations((0.71, 55.85)):
            Circle(SKETCH71_R)
    extrude(amount=-CUT_EXTRUDE41_DEPTH, mode=Mode.SUBTRACT)

    # Sketch72 → Cut-Extrude42 (cut)
    with BuildSketch(Plane(origin=(0, -30.75, 0), x_dir=(-1, 0, 0), z_dir=(0, -1, 0))):
        with Locations((0.71, 55.85)):
            Circle(SKETCH72_R)
    extrude(amount=-CUT_EXTRUDE42_DEPTH, mode=Mode.SUBTRACT)

    # Sketch73 → Cut-Extrude43 (cut)
    with BuildSketch(Plane(origin=(0, -30.75, 0), x_dir=(-1, 0, 0), z_dir=(0, -1, 0))):
        with Locations((-125.11, 55.85)):
            Circle(SKETCH73_R)
    extrude(amount=-CUT_EXTRUDE43_DEPTH, mode=Mode.SUBTRACT)


solid = part.part
